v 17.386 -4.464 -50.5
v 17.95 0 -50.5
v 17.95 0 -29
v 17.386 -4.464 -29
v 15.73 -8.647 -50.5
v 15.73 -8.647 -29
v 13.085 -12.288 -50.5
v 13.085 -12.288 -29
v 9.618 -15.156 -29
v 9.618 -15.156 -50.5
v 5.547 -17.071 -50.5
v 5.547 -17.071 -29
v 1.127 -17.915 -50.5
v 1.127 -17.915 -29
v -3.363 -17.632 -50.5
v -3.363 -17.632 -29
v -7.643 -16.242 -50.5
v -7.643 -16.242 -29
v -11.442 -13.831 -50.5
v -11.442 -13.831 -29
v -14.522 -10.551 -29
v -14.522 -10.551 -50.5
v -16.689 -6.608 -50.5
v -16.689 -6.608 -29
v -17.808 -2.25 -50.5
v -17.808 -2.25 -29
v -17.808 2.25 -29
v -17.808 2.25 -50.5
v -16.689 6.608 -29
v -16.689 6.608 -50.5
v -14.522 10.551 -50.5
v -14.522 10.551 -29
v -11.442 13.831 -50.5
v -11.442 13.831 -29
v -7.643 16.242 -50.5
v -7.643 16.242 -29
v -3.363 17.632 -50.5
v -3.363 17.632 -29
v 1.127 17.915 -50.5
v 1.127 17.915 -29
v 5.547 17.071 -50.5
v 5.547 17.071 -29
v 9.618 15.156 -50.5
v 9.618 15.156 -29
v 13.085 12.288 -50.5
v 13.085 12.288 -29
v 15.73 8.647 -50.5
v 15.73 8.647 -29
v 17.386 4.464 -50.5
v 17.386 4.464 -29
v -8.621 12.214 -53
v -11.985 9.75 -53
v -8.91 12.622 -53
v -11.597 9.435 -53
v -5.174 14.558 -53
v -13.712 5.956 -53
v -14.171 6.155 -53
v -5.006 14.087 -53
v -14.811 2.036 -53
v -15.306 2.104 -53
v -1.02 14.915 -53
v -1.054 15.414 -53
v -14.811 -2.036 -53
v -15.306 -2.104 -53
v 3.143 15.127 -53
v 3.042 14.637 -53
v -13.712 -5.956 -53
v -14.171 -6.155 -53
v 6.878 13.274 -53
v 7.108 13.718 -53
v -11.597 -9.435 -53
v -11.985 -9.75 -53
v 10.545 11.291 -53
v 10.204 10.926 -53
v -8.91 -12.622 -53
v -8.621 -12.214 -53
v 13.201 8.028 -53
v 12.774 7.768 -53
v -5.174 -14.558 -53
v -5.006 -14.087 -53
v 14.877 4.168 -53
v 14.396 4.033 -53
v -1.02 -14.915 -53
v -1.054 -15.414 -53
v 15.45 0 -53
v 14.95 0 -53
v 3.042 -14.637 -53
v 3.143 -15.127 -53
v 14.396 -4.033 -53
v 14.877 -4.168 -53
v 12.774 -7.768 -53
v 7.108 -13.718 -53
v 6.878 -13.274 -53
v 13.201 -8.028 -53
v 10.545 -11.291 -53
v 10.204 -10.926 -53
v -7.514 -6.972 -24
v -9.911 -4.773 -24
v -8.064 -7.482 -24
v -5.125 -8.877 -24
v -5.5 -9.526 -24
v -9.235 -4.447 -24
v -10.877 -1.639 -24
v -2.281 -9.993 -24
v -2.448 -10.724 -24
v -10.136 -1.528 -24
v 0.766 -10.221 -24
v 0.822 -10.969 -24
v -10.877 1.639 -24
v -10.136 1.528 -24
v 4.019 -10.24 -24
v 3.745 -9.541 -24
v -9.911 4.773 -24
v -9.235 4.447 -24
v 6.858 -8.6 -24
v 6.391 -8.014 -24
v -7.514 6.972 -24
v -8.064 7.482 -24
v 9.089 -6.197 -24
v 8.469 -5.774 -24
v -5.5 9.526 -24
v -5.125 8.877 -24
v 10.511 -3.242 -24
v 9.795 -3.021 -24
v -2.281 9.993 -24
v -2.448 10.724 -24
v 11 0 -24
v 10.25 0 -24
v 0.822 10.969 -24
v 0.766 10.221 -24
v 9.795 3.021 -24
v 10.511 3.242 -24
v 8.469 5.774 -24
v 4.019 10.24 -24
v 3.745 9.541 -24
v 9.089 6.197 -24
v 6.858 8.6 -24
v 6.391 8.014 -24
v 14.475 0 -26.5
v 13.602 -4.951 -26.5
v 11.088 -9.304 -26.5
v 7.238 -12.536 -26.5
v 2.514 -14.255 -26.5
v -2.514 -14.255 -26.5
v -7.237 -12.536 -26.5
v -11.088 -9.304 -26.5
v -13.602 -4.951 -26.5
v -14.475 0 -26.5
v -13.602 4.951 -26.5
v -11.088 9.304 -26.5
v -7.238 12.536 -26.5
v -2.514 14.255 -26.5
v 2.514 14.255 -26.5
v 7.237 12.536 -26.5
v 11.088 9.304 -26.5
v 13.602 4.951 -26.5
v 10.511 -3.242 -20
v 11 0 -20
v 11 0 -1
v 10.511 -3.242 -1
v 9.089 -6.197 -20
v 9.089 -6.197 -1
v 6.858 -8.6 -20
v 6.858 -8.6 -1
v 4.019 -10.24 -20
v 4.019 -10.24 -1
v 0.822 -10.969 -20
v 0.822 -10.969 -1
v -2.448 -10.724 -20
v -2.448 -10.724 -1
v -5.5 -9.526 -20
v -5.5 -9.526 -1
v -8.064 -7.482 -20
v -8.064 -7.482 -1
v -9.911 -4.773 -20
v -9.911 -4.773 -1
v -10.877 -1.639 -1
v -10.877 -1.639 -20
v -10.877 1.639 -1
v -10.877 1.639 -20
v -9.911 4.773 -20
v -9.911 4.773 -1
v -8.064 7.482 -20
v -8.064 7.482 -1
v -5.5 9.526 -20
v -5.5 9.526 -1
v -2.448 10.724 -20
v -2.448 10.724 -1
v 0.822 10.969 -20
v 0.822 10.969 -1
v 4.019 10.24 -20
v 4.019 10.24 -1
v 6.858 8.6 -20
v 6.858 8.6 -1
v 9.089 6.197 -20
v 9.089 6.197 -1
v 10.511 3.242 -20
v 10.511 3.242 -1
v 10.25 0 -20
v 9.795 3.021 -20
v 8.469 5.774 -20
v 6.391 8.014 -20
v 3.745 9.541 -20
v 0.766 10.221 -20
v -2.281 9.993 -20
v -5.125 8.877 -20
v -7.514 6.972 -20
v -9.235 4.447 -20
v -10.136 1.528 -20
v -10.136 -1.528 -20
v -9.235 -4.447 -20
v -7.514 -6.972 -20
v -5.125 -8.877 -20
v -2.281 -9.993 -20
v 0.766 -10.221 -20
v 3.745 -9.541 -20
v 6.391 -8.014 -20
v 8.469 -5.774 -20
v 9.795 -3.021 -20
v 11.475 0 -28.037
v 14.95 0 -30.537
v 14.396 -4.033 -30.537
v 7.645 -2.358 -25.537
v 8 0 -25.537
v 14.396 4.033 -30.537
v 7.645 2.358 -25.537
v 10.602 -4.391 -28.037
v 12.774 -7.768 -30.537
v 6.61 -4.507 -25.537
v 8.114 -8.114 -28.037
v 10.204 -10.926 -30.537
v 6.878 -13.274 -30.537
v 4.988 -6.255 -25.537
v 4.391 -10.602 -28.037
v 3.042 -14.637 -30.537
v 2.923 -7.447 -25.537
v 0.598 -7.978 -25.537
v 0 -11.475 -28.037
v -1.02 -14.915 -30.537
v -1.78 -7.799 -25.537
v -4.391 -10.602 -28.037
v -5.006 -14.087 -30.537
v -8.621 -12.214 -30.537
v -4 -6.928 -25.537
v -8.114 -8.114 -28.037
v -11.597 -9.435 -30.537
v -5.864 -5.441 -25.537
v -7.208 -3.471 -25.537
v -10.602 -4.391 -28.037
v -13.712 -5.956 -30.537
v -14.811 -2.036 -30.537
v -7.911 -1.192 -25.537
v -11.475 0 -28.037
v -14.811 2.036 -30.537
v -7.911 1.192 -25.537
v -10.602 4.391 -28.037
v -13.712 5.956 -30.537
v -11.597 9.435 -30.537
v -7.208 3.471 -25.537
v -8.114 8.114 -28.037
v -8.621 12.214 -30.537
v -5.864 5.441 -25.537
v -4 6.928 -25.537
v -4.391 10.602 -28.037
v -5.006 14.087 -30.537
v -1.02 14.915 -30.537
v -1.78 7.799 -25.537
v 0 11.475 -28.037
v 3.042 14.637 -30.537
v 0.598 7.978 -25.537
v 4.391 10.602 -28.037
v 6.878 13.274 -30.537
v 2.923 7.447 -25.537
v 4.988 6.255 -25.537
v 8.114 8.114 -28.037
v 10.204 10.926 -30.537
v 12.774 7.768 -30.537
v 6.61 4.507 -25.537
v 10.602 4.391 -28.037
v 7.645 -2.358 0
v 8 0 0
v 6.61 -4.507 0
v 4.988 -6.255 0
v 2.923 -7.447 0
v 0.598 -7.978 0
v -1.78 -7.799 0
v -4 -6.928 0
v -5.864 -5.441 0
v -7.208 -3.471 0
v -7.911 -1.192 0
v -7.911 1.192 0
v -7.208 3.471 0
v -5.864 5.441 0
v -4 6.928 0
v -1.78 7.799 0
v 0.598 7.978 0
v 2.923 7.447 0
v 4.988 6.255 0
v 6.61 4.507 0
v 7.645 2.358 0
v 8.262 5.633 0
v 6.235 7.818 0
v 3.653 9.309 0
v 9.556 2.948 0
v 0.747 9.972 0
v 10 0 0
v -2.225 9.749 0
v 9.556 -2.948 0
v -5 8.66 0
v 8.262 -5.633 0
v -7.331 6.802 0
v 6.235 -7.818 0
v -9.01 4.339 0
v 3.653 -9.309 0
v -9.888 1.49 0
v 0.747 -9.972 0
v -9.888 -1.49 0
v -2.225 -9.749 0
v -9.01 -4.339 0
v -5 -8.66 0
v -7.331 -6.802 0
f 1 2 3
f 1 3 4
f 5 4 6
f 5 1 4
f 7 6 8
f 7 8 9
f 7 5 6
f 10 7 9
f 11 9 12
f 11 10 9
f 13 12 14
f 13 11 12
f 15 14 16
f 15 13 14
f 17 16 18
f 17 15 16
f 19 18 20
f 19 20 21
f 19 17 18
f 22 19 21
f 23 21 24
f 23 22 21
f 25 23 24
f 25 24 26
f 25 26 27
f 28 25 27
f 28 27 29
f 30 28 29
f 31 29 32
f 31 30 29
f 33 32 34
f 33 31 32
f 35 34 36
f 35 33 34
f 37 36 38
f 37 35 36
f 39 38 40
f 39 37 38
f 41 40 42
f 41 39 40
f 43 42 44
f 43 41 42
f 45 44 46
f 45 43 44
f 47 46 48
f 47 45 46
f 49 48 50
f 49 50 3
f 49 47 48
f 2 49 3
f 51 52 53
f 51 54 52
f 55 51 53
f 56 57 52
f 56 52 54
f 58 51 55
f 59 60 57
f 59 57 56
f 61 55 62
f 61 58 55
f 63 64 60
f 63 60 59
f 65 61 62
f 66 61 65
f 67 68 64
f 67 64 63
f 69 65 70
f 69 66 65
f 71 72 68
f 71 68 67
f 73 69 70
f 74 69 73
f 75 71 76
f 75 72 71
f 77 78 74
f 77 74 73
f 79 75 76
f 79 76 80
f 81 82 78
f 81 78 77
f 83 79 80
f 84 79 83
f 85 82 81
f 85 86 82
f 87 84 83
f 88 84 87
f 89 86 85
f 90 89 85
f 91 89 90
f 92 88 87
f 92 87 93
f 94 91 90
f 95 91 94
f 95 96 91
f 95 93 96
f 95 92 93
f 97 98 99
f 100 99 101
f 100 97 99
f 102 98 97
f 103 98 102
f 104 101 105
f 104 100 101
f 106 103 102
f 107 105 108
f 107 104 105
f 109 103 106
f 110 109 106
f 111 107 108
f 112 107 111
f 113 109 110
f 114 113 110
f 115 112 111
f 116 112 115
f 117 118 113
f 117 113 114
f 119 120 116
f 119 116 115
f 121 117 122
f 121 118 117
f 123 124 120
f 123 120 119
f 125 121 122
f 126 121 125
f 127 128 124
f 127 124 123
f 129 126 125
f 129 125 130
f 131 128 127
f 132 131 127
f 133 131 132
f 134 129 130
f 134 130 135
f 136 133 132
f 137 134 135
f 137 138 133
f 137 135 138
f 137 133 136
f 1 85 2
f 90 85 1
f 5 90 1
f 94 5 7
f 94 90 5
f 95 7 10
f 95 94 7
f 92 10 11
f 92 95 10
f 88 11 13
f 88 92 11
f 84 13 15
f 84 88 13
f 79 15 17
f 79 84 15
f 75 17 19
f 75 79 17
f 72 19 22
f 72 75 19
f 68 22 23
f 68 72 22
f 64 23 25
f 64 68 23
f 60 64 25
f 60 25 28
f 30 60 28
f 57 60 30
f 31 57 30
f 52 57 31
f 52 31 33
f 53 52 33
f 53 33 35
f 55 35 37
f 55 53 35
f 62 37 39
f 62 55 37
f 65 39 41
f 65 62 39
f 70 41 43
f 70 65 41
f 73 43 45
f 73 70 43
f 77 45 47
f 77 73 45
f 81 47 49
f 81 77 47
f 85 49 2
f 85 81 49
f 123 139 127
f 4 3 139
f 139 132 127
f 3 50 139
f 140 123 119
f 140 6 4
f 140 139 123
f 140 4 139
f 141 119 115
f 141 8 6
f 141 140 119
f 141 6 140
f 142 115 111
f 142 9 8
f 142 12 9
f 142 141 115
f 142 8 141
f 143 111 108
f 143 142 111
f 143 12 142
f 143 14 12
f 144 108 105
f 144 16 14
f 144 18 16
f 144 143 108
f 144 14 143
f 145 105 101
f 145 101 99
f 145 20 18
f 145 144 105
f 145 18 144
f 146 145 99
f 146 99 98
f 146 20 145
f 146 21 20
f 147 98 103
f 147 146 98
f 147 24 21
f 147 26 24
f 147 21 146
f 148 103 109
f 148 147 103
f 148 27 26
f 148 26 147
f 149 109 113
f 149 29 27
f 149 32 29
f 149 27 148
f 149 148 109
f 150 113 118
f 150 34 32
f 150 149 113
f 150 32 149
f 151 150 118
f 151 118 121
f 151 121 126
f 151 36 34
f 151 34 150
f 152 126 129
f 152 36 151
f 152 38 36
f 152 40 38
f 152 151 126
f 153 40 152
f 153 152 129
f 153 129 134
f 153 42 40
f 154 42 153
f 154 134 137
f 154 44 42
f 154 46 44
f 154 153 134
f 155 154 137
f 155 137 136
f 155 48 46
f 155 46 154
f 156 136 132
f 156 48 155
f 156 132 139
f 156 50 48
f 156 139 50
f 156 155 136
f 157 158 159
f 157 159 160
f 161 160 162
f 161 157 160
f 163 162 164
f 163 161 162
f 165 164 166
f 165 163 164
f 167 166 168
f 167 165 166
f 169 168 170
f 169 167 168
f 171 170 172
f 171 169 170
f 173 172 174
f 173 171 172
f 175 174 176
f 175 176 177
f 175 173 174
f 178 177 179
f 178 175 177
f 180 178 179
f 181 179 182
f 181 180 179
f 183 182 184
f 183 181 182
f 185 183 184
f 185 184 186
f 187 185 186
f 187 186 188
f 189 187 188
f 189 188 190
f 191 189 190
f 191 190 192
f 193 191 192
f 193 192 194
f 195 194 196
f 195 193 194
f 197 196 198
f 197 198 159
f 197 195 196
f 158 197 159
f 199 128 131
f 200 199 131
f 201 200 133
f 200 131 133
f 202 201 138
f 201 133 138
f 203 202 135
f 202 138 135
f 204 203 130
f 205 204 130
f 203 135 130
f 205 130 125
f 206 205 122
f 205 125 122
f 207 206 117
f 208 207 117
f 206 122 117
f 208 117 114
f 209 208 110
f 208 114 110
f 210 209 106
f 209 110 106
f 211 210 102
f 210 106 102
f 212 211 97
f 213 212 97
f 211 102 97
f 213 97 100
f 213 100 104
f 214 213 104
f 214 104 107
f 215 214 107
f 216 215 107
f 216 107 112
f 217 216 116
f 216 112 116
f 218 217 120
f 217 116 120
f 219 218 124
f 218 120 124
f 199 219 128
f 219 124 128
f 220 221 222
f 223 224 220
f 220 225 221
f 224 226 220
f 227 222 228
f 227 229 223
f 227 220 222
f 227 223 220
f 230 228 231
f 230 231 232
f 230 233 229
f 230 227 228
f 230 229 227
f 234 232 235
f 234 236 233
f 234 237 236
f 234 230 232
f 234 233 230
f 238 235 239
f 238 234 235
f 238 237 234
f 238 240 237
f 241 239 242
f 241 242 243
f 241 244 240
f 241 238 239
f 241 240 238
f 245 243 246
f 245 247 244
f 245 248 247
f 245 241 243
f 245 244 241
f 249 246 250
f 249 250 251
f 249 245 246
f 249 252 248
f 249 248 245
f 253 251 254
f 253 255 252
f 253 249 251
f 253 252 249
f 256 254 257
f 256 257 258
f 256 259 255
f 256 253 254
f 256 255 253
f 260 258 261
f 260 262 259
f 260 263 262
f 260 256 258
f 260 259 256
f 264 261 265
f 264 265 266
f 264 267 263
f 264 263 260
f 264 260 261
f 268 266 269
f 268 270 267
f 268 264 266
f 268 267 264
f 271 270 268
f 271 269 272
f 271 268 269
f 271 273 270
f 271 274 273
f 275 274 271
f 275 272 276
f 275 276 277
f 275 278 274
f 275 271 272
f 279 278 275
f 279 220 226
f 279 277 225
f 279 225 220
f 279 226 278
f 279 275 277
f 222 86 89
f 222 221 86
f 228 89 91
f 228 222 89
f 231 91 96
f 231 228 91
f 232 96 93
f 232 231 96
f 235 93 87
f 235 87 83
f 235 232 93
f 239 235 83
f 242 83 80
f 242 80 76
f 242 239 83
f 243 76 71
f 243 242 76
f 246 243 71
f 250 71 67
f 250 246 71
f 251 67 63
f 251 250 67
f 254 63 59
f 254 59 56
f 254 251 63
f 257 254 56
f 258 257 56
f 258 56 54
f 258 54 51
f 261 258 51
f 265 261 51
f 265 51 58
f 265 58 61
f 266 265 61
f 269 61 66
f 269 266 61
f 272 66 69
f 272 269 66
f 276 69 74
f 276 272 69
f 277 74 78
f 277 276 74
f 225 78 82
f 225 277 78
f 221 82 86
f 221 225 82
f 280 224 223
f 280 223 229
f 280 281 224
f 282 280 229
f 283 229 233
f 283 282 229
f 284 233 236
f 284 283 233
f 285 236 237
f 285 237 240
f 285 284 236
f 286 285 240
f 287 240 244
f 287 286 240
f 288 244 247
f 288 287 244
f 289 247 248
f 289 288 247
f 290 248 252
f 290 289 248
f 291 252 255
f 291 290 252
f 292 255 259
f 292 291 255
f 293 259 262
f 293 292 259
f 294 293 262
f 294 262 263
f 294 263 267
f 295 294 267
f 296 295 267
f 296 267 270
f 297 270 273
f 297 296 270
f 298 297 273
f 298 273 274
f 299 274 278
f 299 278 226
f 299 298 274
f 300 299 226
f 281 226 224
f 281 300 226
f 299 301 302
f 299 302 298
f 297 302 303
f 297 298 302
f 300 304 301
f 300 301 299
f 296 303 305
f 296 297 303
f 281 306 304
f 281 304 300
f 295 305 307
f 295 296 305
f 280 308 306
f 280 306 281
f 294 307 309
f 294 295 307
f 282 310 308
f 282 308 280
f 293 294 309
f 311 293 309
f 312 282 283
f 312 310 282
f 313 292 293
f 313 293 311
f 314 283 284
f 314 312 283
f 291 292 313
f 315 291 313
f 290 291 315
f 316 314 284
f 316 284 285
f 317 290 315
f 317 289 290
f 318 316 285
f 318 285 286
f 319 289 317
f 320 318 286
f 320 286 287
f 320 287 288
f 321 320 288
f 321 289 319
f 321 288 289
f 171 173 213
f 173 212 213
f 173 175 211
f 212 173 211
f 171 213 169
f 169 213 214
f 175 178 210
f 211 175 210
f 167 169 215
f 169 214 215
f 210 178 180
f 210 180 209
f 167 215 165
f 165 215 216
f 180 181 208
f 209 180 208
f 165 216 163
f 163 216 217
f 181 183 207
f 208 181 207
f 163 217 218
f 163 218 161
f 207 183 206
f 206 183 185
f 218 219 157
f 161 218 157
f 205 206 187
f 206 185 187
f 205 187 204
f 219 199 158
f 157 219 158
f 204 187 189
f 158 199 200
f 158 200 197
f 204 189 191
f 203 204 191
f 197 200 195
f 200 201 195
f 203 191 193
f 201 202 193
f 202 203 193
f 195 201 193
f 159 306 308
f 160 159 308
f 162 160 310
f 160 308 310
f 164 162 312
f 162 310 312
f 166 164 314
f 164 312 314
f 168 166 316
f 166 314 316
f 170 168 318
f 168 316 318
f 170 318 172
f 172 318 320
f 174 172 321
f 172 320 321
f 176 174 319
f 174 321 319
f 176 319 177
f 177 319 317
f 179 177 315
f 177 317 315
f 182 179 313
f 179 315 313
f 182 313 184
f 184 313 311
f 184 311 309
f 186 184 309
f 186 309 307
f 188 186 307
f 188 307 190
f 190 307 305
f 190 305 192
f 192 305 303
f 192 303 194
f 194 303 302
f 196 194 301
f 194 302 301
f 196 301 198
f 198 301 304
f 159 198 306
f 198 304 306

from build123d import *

# Parameters (mm, degrees)
CHAMFER1_SIZE      = 2.5
CUT_EXTRUDE1_START = -24
SKETCH3_R          = 11
SKETCH3_R_2        = 10.25
CUT_EXTRUDE1_DEPTH = 4
CHAMFER2_SIZE      = 1


with BuildPart() as part:
    # Sketch2 → Revolve1 (revolve)
    with BuildSketch(Plane(origin=(0, 0, 0), x_dir=(0, 0, -1), z_dir=(1, 0, 0))):
        Polygon((0, 11), (24, 11), (29, 17.95), (53, 17.95), (53, 14.95), (30.537419245, 14.95), (25.537419245, 8), (0, 8), align=None)
    revolve(axis=Axis((0, 0, 0), (0, 0, -1)))

    # Chamfer1
    chamfer1_edges = [part.edges().sort_by_distance(p)[0] for p in [
        (0, -17.95, -53),
    ]]
    chamfer(chamfer1_edges, length=CHAMFER1_SIZE)

    # Sketch3 → Cut-Extrude1 (cut)
    with BuildSketch(Plane.XY.offset(CUT_EXTRUDE1_START)):
        Circle(SKETCH3_R)
        Circle(SKETCH3_R_2, mode=Mode.SUBTRACT)
    extrude(amount=CUT_EXTRUDE1_DEPTH, mode=Mode.SUBTRACT)

    # Chamfer2
    chamfer2_edges = [part.edges().sort_by_distance(p)[0] for p in [
        (0, -11, 0),
    ]]
    chamfer(chamfer2_edges, length=CHAMFER2_SIZE)


solid = part.part
